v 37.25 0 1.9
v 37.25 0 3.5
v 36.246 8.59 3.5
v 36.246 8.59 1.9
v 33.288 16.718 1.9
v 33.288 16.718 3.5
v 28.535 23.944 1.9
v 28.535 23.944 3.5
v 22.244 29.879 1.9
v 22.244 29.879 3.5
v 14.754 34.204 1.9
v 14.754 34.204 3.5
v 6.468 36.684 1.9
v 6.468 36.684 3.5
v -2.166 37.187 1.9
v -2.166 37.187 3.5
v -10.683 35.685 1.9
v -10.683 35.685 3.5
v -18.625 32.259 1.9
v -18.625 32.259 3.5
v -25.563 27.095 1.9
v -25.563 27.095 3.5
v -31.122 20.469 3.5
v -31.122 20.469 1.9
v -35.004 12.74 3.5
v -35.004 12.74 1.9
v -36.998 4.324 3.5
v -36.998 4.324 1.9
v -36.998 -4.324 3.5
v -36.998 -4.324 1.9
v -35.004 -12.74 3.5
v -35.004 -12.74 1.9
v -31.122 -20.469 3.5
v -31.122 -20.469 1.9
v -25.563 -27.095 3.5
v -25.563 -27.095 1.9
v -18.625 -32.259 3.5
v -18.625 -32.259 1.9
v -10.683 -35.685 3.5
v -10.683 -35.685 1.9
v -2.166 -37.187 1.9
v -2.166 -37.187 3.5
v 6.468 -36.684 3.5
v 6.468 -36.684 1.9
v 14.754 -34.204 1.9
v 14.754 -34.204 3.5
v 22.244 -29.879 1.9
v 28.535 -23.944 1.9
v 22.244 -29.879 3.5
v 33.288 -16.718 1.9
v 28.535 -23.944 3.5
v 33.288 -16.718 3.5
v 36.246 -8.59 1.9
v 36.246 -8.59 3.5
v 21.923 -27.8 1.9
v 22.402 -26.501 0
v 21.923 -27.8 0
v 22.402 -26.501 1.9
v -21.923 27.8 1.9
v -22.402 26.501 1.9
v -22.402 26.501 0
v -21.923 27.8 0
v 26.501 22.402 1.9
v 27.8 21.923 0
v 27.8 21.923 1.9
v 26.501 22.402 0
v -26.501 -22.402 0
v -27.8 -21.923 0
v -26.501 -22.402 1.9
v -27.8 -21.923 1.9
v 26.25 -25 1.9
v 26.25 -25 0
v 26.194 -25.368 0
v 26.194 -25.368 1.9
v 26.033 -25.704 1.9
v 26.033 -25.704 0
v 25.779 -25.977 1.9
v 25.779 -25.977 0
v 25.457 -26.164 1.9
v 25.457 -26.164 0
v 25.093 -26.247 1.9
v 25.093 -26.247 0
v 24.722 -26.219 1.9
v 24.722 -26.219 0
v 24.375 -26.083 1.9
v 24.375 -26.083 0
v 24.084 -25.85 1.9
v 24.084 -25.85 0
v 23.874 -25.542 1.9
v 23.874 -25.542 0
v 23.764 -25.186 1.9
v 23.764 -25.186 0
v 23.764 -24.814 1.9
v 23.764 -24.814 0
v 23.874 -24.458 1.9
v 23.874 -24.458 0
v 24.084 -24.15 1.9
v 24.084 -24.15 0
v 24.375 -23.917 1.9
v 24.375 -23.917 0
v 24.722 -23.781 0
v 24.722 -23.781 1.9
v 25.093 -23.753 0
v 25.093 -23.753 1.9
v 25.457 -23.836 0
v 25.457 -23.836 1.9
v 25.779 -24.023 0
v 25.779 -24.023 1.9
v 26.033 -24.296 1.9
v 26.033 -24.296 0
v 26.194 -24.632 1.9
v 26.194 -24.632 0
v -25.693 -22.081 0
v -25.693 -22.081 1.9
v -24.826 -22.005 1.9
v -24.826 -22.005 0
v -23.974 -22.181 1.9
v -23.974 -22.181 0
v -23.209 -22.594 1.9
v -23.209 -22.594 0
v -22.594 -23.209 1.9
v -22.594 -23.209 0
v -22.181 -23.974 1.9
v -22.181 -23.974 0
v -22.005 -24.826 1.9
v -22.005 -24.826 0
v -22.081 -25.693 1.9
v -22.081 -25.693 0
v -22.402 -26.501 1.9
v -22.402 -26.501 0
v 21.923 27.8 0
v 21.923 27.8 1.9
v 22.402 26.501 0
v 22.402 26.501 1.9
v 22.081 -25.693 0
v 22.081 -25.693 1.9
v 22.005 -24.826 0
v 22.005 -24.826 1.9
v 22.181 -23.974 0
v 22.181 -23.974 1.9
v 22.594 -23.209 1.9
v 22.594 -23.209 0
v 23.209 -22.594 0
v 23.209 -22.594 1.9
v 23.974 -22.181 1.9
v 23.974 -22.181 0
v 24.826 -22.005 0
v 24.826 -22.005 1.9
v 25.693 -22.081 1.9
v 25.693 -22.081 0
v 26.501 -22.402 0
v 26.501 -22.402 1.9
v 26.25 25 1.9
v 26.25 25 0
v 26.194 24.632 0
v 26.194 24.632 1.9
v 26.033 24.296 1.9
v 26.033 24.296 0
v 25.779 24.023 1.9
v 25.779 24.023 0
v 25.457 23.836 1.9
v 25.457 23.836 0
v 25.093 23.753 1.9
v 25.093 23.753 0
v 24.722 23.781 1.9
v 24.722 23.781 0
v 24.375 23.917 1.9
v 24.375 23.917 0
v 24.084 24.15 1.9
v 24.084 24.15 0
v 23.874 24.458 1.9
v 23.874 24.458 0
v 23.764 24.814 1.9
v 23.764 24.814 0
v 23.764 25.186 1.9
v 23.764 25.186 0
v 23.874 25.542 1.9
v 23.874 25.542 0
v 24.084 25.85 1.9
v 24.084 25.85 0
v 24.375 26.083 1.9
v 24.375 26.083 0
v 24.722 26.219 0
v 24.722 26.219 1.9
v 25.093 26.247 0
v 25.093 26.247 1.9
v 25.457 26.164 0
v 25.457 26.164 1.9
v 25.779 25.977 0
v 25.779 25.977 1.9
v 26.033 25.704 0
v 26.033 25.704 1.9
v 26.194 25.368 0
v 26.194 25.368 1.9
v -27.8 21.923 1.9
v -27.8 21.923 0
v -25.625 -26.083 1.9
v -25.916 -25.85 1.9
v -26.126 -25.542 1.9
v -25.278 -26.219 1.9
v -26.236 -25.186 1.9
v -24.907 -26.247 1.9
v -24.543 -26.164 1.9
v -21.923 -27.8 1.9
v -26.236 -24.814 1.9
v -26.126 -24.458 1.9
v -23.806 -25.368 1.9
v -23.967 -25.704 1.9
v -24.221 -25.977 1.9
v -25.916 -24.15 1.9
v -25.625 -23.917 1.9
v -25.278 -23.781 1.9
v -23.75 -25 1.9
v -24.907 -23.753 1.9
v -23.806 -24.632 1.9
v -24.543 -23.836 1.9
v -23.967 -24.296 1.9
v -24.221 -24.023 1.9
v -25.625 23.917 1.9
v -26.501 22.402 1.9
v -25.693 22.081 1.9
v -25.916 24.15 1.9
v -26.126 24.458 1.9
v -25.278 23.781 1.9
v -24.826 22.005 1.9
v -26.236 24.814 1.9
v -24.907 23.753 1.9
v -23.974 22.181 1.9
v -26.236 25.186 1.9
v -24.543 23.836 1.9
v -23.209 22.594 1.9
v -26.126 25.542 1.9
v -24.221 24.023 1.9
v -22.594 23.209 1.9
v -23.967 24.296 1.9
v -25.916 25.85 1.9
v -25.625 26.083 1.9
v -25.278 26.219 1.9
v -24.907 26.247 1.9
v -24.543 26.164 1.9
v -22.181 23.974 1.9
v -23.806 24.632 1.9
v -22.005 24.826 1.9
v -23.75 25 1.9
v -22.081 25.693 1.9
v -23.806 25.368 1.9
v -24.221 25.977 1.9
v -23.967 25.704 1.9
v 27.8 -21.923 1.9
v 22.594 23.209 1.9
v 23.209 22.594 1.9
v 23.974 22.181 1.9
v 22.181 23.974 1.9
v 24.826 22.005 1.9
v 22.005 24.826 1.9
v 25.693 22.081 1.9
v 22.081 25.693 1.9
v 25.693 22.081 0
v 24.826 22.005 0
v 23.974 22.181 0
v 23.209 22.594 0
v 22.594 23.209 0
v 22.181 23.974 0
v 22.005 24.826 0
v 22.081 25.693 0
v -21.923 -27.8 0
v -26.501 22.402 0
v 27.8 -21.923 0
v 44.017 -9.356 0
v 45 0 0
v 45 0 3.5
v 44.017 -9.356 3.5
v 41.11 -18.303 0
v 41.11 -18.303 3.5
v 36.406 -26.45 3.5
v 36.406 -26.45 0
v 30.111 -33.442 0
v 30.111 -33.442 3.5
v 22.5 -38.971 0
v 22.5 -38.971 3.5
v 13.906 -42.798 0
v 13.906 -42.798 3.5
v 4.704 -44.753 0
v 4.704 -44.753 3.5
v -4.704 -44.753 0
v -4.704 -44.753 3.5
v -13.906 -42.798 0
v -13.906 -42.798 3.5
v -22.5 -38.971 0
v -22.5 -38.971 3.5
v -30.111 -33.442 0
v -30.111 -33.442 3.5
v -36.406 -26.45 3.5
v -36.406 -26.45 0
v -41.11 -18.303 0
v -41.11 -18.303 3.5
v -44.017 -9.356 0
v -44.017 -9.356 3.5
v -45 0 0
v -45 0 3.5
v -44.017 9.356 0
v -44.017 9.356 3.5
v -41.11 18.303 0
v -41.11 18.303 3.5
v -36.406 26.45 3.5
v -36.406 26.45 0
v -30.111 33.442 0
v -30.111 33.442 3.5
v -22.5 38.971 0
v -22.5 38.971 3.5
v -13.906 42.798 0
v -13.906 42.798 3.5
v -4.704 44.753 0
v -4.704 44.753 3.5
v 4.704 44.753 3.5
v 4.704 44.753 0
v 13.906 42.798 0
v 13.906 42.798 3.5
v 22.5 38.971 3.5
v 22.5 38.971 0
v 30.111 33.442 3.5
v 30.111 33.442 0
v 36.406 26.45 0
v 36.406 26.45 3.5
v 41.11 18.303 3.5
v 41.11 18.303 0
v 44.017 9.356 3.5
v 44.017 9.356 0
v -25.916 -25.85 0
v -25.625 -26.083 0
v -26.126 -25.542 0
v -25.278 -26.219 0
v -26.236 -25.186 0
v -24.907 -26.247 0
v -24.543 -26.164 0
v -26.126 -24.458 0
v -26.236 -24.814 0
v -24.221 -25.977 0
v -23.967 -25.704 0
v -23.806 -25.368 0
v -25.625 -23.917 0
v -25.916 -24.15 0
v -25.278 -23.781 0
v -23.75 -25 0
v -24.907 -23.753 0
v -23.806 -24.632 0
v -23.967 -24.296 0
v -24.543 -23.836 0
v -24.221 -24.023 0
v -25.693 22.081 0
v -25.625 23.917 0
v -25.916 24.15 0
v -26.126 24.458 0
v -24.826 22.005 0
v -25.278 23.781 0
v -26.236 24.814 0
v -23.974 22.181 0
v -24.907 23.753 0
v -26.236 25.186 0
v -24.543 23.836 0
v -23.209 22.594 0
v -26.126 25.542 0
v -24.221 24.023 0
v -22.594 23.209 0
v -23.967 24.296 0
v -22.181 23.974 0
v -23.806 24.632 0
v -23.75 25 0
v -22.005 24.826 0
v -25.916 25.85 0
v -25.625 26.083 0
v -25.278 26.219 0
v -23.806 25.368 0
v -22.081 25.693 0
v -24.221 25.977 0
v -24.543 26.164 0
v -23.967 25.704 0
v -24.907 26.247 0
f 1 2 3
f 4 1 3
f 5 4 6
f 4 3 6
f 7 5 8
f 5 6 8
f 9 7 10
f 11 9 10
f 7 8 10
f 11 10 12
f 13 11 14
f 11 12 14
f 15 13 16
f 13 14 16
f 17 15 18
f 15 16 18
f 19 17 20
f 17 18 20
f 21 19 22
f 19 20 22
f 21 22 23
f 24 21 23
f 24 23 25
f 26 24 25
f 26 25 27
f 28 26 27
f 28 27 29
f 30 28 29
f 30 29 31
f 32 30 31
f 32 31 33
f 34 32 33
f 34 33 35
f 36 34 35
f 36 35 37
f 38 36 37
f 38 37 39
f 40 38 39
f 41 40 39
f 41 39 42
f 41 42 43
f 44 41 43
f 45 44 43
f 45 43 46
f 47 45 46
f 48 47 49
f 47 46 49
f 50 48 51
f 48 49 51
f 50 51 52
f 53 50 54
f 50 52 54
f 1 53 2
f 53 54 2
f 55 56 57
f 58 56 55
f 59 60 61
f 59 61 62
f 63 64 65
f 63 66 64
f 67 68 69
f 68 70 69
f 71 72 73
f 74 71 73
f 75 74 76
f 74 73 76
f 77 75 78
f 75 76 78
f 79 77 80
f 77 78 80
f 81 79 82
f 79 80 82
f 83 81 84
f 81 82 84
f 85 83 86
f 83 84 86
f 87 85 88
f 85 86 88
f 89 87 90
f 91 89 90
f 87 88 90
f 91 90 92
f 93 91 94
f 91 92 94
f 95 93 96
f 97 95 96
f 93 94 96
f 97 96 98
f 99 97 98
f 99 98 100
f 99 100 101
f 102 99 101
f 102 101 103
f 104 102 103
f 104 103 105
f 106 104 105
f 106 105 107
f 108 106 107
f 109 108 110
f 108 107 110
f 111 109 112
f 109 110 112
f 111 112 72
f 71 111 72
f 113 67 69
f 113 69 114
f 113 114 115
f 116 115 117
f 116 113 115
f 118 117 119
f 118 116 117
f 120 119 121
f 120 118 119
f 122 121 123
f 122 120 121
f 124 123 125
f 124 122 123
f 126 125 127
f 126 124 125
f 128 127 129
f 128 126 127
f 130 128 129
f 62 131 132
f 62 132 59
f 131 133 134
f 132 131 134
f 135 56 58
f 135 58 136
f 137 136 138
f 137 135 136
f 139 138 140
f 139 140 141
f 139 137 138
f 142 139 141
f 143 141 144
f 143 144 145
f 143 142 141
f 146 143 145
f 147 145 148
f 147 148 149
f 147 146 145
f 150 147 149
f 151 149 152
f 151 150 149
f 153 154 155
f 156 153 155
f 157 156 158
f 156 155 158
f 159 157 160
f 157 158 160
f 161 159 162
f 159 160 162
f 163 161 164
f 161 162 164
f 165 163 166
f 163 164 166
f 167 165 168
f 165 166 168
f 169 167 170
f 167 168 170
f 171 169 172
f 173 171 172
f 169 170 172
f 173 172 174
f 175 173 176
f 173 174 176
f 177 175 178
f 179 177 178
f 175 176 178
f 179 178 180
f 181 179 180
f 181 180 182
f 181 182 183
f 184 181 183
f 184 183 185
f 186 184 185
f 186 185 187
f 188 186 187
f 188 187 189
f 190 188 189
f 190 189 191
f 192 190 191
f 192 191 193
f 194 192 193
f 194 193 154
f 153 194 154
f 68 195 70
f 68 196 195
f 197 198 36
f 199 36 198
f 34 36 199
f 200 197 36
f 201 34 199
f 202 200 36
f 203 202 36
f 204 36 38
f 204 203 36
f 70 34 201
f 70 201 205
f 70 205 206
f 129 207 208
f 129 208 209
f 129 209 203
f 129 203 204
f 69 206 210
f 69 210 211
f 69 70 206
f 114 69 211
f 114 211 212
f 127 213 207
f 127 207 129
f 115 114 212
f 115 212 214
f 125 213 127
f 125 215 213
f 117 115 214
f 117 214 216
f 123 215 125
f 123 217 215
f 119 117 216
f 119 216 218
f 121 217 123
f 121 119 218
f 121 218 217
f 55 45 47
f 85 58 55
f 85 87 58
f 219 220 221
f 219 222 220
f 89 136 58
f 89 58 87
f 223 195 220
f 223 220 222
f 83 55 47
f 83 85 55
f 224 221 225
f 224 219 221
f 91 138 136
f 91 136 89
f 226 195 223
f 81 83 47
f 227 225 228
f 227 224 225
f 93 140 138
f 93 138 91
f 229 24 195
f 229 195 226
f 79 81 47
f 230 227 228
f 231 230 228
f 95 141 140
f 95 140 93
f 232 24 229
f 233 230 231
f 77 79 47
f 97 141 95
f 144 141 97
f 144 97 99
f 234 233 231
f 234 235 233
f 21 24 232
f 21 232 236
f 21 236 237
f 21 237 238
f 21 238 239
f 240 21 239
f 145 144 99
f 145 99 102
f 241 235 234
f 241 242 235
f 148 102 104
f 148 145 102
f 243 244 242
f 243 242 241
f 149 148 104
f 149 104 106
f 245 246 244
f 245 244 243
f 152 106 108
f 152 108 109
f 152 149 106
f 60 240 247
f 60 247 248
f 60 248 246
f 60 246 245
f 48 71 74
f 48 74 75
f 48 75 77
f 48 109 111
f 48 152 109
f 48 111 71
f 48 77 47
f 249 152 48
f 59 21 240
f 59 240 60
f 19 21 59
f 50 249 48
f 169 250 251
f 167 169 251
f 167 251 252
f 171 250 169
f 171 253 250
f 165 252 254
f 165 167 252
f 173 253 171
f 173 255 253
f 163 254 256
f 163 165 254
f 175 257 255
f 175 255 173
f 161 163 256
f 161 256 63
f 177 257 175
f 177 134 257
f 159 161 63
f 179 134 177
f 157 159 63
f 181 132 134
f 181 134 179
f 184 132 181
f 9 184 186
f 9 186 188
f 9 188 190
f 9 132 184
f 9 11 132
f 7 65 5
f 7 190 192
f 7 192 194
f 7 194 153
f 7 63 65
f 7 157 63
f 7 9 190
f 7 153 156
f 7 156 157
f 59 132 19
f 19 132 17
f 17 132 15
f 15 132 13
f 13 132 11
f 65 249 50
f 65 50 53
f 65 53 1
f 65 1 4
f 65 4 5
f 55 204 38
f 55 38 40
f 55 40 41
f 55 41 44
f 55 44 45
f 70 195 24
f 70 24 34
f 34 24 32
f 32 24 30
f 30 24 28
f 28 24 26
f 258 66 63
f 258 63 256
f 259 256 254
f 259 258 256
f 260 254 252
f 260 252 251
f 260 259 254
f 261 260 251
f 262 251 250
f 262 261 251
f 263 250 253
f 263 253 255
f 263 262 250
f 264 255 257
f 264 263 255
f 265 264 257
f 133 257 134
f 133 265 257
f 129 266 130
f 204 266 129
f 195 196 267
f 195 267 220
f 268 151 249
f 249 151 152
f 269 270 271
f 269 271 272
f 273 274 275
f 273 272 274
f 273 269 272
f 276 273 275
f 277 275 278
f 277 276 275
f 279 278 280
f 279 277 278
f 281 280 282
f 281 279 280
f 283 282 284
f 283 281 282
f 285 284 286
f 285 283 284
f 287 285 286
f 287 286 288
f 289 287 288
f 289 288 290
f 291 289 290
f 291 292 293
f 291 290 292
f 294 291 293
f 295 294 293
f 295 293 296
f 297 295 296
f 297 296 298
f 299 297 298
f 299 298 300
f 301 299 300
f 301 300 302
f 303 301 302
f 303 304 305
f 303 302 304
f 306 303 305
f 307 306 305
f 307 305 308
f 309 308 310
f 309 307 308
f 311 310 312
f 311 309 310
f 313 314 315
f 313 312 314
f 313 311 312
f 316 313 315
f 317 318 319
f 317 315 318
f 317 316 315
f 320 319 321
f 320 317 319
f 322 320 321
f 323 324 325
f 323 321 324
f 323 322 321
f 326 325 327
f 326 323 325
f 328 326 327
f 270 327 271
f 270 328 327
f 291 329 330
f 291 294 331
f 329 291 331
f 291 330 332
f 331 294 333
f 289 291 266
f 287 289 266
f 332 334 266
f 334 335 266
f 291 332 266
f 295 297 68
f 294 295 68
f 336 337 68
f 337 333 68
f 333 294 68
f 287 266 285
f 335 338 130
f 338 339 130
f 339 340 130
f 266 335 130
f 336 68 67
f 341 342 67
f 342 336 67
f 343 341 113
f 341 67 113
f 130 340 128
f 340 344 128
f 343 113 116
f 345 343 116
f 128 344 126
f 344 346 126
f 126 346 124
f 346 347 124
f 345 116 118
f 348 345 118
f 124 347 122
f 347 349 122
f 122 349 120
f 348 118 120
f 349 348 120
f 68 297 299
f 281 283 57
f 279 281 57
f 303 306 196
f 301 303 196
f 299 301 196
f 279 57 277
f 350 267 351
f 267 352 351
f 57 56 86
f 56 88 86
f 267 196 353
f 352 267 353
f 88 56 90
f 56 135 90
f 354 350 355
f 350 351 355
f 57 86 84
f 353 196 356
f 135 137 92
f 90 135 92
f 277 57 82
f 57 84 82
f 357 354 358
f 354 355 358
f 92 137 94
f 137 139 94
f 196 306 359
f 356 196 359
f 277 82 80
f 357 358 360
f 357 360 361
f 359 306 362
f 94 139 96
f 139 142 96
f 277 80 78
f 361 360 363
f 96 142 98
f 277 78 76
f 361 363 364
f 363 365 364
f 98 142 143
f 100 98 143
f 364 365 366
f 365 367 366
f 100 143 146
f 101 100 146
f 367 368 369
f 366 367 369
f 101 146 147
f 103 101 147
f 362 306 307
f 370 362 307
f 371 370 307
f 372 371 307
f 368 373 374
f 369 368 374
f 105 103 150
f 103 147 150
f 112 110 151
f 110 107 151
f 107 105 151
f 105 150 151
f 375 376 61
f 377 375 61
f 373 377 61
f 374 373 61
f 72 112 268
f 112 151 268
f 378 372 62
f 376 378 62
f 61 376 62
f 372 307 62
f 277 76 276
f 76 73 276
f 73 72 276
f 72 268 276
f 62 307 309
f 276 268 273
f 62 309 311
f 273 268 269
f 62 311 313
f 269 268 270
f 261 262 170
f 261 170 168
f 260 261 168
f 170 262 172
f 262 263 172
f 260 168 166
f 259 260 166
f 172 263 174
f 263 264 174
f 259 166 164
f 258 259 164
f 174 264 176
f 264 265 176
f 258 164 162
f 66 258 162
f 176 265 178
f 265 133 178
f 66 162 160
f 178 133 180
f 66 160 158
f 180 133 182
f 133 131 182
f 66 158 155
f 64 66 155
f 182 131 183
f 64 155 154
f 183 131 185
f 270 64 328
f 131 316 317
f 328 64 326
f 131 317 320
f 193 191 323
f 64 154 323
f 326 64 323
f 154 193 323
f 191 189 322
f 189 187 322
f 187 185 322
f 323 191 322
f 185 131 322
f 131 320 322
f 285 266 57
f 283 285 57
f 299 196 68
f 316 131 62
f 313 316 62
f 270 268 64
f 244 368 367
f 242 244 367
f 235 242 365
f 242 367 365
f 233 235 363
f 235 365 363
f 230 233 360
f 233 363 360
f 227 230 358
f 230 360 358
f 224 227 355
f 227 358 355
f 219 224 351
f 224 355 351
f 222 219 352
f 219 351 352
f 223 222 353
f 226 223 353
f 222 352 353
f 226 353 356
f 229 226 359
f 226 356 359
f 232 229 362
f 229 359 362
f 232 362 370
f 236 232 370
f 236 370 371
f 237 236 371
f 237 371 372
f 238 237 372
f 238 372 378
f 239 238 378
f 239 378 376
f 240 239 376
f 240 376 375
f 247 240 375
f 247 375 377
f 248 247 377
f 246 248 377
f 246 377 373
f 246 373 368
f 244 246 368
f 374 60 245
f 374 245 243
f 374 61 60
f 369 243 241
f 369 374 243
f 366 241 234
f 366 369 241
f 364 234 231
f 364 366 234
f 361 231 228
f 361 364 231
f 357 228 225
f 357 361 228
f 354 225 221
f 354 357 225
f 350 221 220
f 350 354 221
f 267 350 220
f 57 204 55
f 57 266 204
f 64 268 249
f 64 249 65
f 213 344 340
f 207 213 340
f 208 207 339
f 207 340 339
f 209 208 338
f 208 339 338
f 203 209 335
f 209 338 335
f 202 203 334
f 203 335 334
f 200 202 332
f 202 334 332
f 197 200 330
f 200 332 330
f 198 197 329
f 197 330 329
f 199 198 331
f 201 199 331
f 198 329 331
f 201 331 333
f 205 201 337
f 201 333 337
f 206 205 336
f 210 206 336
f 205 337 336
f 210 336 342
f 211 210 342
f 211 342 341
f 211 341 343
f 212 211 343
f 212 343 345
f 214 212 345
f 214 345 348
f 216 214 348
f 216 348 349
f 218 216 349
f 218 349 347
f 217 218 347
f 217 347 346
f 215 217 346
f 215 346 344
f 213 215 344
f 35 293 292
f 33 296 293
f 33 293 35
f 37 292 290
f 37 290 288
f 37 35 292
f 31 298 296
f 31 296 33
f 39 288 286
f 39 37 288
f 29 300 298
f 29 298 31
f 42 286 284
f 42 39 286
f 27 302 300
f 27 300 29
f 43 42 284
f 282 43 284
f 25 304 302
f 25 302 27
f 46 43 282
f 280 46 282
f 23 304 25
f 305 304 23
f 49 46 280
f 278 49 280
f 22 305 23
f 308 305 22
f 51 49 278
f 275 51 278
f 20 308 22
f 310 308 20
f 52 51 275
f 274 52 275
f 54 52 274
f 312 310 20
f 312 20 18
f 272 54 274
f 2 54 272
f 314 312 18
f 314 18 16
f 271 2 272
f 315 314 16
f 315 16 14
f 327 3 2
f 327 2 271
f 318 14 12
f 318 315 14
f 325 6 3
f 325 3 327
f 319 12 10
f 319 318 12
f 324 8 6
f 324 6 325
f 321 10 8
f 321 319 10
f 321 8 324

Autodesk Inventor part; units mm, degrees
ref_plane "YZ Plane" through (0, 0, 0) normal (1, 0, 0) x (0, 1, 0)
ref_plane "XZ Plane" through (0, 0, 0) normal (0, 1, 0) x (-1, 0, 0)
ref_plane "XY Plane" through (0, 0, 0) normal (0, 0, 1) x (1, 0, 0)
sketch "Sketch1" plane through (0, 0, 0) normal (0, 0, 1) x (1, 0, 0)
  line L0 (-25, 25) -> (25, 25)
  line L1 (25, 25) -> (25, -25)
  line L2 (25, -25) -> (-25, -25)
  line L3 (-25, -25) -> (-25, 25)
  circle A0 centre (-25, 25) radius 1.25
  circle A1 centre (-25, 25) radius 3
  circle A2 centre (-25, -25) radius 3
  circle A3 centre (-25, -25) radius 1.25
  circle A4 centre (25, -25) radius 3
  circle A5 centre (25, -25) radius 1.25
  circle A6 centre (25, 25) radius 3
  circle A7 centre (25, 25) radius 1.25
  circle A8 centre (0, 0) radius 45
  line L4 (27.8, 27.8) -> (-27.8, 27.8)
  line L5 (-27.8, 27.8) -> (-27.8, -27.8)
  line L6 (-27.8, -27.8) -> (27.8, -27.8)
  line L7 (27.8, -27.8) -> (27.8, 27.8)
  point P0 (-22, 25)
  point P1 (22, 25)
  point P2 (25, 22)
  point P3 (25, -22)
  point P4 (22, -25)
  point P5 (-22, -25)
  point P6 (-25, -22)
  point P7 (-25, 22)
  point P8 (-23.923, 27.8)
  point P9 (23.923, 27.8)
  point P10 (27.8, 23.923)
  point P11 (27.8, -23.923)
  point P12 (23.923, -27.8)
  point P13 (-23.923, -27.8)
  point P14 (-27.8, -23.923)
  point P15 (-27.8, 23.923)
  dimension "d0" = 50
  dimension "d1" = 25
  dimension "d2" = 50
  dimension "d3" = 25
  dimension "d4" = 2.5
  dimension "d5" = 6
  dimension "d8" = 360
  dimension "d12" = 90
  dimension "d14" = 2.8
extrude "Extrusion1" add sketch "Sketch1" along normal blind 3.5 contours A0 L3 A1 L5 L4 L0 | L0 A1 L3 A0 | A6 L4 L7 L1 A7 L0 | L0 A7 L1 A6 | L4 A1 | A2 L2 A3 L3 | L3 A3 L2 A2 L6 L5 | A1 L5 | A6 L4 | A1 L5 L4 | L5 A2 | L4 L7 A6 | A4 L7 L6 L2 A5 L1 | L1 A5 L2 A4 | L7 A6 | A2 L6 | A2 L6 L5 | A4 L7 | L6 A4 | L7 L6 A4 | A8
chamfer "Chamfer1" distance 2 angle 45 8 edges at (-23.923, -27.8, 1.75) (-27.8, -23.923, 1.75) (23.923, -27.8, 1.75) (27.8, -23.923, 1.75) (23.923, 27.8, 1.75) (27.8, 23.923, 1.75) (-23.923, 27.8, 1.75) (-27.8, 23.923, 1.75)
sketch "Sketch2" plane through (0, 0, 3.5) normal (0, 0, 1) x (1, 0, 0)
  circle A0 centre (0, 0) radius 37.25
  dimension "d18" = 74.5
extrude "Extrusion2" cut sketch "Sketch2" against normal blind 1.6
sketch "Sketch3" plane through (0, 0, 0) normal (0, 0, -1) x (-1, 0, 0)
  circle A0 centre (-17.9346, -27.7011) radius 1.65 projected
  circle A1 centre (15.0226, -29.3824) radius 1.65 projected
  circle A2 centre (15.0226, -29.3824) radius 1.65
  circle A3 centre (32.9571, -1.6813) radius 1.65
  circle A4 centre (17.9346, 27.7011) radius 1.65
  circle A5 centre (-15.0226, 29.3824) radius 1.65
  circle A6 centre (-32.9571, 1.6813) radius 1.65
  circle A7 centre (-17.9346, -27.7011) radius 1.65
  point P0 (0, 0)
  dimension "d23" = 360
equation "\"d1\" = 0.5 * d0"
equation "\"d2\" = d0"
equation "\"d3\" = d1"
properties part number "moteus_x1_mount"
